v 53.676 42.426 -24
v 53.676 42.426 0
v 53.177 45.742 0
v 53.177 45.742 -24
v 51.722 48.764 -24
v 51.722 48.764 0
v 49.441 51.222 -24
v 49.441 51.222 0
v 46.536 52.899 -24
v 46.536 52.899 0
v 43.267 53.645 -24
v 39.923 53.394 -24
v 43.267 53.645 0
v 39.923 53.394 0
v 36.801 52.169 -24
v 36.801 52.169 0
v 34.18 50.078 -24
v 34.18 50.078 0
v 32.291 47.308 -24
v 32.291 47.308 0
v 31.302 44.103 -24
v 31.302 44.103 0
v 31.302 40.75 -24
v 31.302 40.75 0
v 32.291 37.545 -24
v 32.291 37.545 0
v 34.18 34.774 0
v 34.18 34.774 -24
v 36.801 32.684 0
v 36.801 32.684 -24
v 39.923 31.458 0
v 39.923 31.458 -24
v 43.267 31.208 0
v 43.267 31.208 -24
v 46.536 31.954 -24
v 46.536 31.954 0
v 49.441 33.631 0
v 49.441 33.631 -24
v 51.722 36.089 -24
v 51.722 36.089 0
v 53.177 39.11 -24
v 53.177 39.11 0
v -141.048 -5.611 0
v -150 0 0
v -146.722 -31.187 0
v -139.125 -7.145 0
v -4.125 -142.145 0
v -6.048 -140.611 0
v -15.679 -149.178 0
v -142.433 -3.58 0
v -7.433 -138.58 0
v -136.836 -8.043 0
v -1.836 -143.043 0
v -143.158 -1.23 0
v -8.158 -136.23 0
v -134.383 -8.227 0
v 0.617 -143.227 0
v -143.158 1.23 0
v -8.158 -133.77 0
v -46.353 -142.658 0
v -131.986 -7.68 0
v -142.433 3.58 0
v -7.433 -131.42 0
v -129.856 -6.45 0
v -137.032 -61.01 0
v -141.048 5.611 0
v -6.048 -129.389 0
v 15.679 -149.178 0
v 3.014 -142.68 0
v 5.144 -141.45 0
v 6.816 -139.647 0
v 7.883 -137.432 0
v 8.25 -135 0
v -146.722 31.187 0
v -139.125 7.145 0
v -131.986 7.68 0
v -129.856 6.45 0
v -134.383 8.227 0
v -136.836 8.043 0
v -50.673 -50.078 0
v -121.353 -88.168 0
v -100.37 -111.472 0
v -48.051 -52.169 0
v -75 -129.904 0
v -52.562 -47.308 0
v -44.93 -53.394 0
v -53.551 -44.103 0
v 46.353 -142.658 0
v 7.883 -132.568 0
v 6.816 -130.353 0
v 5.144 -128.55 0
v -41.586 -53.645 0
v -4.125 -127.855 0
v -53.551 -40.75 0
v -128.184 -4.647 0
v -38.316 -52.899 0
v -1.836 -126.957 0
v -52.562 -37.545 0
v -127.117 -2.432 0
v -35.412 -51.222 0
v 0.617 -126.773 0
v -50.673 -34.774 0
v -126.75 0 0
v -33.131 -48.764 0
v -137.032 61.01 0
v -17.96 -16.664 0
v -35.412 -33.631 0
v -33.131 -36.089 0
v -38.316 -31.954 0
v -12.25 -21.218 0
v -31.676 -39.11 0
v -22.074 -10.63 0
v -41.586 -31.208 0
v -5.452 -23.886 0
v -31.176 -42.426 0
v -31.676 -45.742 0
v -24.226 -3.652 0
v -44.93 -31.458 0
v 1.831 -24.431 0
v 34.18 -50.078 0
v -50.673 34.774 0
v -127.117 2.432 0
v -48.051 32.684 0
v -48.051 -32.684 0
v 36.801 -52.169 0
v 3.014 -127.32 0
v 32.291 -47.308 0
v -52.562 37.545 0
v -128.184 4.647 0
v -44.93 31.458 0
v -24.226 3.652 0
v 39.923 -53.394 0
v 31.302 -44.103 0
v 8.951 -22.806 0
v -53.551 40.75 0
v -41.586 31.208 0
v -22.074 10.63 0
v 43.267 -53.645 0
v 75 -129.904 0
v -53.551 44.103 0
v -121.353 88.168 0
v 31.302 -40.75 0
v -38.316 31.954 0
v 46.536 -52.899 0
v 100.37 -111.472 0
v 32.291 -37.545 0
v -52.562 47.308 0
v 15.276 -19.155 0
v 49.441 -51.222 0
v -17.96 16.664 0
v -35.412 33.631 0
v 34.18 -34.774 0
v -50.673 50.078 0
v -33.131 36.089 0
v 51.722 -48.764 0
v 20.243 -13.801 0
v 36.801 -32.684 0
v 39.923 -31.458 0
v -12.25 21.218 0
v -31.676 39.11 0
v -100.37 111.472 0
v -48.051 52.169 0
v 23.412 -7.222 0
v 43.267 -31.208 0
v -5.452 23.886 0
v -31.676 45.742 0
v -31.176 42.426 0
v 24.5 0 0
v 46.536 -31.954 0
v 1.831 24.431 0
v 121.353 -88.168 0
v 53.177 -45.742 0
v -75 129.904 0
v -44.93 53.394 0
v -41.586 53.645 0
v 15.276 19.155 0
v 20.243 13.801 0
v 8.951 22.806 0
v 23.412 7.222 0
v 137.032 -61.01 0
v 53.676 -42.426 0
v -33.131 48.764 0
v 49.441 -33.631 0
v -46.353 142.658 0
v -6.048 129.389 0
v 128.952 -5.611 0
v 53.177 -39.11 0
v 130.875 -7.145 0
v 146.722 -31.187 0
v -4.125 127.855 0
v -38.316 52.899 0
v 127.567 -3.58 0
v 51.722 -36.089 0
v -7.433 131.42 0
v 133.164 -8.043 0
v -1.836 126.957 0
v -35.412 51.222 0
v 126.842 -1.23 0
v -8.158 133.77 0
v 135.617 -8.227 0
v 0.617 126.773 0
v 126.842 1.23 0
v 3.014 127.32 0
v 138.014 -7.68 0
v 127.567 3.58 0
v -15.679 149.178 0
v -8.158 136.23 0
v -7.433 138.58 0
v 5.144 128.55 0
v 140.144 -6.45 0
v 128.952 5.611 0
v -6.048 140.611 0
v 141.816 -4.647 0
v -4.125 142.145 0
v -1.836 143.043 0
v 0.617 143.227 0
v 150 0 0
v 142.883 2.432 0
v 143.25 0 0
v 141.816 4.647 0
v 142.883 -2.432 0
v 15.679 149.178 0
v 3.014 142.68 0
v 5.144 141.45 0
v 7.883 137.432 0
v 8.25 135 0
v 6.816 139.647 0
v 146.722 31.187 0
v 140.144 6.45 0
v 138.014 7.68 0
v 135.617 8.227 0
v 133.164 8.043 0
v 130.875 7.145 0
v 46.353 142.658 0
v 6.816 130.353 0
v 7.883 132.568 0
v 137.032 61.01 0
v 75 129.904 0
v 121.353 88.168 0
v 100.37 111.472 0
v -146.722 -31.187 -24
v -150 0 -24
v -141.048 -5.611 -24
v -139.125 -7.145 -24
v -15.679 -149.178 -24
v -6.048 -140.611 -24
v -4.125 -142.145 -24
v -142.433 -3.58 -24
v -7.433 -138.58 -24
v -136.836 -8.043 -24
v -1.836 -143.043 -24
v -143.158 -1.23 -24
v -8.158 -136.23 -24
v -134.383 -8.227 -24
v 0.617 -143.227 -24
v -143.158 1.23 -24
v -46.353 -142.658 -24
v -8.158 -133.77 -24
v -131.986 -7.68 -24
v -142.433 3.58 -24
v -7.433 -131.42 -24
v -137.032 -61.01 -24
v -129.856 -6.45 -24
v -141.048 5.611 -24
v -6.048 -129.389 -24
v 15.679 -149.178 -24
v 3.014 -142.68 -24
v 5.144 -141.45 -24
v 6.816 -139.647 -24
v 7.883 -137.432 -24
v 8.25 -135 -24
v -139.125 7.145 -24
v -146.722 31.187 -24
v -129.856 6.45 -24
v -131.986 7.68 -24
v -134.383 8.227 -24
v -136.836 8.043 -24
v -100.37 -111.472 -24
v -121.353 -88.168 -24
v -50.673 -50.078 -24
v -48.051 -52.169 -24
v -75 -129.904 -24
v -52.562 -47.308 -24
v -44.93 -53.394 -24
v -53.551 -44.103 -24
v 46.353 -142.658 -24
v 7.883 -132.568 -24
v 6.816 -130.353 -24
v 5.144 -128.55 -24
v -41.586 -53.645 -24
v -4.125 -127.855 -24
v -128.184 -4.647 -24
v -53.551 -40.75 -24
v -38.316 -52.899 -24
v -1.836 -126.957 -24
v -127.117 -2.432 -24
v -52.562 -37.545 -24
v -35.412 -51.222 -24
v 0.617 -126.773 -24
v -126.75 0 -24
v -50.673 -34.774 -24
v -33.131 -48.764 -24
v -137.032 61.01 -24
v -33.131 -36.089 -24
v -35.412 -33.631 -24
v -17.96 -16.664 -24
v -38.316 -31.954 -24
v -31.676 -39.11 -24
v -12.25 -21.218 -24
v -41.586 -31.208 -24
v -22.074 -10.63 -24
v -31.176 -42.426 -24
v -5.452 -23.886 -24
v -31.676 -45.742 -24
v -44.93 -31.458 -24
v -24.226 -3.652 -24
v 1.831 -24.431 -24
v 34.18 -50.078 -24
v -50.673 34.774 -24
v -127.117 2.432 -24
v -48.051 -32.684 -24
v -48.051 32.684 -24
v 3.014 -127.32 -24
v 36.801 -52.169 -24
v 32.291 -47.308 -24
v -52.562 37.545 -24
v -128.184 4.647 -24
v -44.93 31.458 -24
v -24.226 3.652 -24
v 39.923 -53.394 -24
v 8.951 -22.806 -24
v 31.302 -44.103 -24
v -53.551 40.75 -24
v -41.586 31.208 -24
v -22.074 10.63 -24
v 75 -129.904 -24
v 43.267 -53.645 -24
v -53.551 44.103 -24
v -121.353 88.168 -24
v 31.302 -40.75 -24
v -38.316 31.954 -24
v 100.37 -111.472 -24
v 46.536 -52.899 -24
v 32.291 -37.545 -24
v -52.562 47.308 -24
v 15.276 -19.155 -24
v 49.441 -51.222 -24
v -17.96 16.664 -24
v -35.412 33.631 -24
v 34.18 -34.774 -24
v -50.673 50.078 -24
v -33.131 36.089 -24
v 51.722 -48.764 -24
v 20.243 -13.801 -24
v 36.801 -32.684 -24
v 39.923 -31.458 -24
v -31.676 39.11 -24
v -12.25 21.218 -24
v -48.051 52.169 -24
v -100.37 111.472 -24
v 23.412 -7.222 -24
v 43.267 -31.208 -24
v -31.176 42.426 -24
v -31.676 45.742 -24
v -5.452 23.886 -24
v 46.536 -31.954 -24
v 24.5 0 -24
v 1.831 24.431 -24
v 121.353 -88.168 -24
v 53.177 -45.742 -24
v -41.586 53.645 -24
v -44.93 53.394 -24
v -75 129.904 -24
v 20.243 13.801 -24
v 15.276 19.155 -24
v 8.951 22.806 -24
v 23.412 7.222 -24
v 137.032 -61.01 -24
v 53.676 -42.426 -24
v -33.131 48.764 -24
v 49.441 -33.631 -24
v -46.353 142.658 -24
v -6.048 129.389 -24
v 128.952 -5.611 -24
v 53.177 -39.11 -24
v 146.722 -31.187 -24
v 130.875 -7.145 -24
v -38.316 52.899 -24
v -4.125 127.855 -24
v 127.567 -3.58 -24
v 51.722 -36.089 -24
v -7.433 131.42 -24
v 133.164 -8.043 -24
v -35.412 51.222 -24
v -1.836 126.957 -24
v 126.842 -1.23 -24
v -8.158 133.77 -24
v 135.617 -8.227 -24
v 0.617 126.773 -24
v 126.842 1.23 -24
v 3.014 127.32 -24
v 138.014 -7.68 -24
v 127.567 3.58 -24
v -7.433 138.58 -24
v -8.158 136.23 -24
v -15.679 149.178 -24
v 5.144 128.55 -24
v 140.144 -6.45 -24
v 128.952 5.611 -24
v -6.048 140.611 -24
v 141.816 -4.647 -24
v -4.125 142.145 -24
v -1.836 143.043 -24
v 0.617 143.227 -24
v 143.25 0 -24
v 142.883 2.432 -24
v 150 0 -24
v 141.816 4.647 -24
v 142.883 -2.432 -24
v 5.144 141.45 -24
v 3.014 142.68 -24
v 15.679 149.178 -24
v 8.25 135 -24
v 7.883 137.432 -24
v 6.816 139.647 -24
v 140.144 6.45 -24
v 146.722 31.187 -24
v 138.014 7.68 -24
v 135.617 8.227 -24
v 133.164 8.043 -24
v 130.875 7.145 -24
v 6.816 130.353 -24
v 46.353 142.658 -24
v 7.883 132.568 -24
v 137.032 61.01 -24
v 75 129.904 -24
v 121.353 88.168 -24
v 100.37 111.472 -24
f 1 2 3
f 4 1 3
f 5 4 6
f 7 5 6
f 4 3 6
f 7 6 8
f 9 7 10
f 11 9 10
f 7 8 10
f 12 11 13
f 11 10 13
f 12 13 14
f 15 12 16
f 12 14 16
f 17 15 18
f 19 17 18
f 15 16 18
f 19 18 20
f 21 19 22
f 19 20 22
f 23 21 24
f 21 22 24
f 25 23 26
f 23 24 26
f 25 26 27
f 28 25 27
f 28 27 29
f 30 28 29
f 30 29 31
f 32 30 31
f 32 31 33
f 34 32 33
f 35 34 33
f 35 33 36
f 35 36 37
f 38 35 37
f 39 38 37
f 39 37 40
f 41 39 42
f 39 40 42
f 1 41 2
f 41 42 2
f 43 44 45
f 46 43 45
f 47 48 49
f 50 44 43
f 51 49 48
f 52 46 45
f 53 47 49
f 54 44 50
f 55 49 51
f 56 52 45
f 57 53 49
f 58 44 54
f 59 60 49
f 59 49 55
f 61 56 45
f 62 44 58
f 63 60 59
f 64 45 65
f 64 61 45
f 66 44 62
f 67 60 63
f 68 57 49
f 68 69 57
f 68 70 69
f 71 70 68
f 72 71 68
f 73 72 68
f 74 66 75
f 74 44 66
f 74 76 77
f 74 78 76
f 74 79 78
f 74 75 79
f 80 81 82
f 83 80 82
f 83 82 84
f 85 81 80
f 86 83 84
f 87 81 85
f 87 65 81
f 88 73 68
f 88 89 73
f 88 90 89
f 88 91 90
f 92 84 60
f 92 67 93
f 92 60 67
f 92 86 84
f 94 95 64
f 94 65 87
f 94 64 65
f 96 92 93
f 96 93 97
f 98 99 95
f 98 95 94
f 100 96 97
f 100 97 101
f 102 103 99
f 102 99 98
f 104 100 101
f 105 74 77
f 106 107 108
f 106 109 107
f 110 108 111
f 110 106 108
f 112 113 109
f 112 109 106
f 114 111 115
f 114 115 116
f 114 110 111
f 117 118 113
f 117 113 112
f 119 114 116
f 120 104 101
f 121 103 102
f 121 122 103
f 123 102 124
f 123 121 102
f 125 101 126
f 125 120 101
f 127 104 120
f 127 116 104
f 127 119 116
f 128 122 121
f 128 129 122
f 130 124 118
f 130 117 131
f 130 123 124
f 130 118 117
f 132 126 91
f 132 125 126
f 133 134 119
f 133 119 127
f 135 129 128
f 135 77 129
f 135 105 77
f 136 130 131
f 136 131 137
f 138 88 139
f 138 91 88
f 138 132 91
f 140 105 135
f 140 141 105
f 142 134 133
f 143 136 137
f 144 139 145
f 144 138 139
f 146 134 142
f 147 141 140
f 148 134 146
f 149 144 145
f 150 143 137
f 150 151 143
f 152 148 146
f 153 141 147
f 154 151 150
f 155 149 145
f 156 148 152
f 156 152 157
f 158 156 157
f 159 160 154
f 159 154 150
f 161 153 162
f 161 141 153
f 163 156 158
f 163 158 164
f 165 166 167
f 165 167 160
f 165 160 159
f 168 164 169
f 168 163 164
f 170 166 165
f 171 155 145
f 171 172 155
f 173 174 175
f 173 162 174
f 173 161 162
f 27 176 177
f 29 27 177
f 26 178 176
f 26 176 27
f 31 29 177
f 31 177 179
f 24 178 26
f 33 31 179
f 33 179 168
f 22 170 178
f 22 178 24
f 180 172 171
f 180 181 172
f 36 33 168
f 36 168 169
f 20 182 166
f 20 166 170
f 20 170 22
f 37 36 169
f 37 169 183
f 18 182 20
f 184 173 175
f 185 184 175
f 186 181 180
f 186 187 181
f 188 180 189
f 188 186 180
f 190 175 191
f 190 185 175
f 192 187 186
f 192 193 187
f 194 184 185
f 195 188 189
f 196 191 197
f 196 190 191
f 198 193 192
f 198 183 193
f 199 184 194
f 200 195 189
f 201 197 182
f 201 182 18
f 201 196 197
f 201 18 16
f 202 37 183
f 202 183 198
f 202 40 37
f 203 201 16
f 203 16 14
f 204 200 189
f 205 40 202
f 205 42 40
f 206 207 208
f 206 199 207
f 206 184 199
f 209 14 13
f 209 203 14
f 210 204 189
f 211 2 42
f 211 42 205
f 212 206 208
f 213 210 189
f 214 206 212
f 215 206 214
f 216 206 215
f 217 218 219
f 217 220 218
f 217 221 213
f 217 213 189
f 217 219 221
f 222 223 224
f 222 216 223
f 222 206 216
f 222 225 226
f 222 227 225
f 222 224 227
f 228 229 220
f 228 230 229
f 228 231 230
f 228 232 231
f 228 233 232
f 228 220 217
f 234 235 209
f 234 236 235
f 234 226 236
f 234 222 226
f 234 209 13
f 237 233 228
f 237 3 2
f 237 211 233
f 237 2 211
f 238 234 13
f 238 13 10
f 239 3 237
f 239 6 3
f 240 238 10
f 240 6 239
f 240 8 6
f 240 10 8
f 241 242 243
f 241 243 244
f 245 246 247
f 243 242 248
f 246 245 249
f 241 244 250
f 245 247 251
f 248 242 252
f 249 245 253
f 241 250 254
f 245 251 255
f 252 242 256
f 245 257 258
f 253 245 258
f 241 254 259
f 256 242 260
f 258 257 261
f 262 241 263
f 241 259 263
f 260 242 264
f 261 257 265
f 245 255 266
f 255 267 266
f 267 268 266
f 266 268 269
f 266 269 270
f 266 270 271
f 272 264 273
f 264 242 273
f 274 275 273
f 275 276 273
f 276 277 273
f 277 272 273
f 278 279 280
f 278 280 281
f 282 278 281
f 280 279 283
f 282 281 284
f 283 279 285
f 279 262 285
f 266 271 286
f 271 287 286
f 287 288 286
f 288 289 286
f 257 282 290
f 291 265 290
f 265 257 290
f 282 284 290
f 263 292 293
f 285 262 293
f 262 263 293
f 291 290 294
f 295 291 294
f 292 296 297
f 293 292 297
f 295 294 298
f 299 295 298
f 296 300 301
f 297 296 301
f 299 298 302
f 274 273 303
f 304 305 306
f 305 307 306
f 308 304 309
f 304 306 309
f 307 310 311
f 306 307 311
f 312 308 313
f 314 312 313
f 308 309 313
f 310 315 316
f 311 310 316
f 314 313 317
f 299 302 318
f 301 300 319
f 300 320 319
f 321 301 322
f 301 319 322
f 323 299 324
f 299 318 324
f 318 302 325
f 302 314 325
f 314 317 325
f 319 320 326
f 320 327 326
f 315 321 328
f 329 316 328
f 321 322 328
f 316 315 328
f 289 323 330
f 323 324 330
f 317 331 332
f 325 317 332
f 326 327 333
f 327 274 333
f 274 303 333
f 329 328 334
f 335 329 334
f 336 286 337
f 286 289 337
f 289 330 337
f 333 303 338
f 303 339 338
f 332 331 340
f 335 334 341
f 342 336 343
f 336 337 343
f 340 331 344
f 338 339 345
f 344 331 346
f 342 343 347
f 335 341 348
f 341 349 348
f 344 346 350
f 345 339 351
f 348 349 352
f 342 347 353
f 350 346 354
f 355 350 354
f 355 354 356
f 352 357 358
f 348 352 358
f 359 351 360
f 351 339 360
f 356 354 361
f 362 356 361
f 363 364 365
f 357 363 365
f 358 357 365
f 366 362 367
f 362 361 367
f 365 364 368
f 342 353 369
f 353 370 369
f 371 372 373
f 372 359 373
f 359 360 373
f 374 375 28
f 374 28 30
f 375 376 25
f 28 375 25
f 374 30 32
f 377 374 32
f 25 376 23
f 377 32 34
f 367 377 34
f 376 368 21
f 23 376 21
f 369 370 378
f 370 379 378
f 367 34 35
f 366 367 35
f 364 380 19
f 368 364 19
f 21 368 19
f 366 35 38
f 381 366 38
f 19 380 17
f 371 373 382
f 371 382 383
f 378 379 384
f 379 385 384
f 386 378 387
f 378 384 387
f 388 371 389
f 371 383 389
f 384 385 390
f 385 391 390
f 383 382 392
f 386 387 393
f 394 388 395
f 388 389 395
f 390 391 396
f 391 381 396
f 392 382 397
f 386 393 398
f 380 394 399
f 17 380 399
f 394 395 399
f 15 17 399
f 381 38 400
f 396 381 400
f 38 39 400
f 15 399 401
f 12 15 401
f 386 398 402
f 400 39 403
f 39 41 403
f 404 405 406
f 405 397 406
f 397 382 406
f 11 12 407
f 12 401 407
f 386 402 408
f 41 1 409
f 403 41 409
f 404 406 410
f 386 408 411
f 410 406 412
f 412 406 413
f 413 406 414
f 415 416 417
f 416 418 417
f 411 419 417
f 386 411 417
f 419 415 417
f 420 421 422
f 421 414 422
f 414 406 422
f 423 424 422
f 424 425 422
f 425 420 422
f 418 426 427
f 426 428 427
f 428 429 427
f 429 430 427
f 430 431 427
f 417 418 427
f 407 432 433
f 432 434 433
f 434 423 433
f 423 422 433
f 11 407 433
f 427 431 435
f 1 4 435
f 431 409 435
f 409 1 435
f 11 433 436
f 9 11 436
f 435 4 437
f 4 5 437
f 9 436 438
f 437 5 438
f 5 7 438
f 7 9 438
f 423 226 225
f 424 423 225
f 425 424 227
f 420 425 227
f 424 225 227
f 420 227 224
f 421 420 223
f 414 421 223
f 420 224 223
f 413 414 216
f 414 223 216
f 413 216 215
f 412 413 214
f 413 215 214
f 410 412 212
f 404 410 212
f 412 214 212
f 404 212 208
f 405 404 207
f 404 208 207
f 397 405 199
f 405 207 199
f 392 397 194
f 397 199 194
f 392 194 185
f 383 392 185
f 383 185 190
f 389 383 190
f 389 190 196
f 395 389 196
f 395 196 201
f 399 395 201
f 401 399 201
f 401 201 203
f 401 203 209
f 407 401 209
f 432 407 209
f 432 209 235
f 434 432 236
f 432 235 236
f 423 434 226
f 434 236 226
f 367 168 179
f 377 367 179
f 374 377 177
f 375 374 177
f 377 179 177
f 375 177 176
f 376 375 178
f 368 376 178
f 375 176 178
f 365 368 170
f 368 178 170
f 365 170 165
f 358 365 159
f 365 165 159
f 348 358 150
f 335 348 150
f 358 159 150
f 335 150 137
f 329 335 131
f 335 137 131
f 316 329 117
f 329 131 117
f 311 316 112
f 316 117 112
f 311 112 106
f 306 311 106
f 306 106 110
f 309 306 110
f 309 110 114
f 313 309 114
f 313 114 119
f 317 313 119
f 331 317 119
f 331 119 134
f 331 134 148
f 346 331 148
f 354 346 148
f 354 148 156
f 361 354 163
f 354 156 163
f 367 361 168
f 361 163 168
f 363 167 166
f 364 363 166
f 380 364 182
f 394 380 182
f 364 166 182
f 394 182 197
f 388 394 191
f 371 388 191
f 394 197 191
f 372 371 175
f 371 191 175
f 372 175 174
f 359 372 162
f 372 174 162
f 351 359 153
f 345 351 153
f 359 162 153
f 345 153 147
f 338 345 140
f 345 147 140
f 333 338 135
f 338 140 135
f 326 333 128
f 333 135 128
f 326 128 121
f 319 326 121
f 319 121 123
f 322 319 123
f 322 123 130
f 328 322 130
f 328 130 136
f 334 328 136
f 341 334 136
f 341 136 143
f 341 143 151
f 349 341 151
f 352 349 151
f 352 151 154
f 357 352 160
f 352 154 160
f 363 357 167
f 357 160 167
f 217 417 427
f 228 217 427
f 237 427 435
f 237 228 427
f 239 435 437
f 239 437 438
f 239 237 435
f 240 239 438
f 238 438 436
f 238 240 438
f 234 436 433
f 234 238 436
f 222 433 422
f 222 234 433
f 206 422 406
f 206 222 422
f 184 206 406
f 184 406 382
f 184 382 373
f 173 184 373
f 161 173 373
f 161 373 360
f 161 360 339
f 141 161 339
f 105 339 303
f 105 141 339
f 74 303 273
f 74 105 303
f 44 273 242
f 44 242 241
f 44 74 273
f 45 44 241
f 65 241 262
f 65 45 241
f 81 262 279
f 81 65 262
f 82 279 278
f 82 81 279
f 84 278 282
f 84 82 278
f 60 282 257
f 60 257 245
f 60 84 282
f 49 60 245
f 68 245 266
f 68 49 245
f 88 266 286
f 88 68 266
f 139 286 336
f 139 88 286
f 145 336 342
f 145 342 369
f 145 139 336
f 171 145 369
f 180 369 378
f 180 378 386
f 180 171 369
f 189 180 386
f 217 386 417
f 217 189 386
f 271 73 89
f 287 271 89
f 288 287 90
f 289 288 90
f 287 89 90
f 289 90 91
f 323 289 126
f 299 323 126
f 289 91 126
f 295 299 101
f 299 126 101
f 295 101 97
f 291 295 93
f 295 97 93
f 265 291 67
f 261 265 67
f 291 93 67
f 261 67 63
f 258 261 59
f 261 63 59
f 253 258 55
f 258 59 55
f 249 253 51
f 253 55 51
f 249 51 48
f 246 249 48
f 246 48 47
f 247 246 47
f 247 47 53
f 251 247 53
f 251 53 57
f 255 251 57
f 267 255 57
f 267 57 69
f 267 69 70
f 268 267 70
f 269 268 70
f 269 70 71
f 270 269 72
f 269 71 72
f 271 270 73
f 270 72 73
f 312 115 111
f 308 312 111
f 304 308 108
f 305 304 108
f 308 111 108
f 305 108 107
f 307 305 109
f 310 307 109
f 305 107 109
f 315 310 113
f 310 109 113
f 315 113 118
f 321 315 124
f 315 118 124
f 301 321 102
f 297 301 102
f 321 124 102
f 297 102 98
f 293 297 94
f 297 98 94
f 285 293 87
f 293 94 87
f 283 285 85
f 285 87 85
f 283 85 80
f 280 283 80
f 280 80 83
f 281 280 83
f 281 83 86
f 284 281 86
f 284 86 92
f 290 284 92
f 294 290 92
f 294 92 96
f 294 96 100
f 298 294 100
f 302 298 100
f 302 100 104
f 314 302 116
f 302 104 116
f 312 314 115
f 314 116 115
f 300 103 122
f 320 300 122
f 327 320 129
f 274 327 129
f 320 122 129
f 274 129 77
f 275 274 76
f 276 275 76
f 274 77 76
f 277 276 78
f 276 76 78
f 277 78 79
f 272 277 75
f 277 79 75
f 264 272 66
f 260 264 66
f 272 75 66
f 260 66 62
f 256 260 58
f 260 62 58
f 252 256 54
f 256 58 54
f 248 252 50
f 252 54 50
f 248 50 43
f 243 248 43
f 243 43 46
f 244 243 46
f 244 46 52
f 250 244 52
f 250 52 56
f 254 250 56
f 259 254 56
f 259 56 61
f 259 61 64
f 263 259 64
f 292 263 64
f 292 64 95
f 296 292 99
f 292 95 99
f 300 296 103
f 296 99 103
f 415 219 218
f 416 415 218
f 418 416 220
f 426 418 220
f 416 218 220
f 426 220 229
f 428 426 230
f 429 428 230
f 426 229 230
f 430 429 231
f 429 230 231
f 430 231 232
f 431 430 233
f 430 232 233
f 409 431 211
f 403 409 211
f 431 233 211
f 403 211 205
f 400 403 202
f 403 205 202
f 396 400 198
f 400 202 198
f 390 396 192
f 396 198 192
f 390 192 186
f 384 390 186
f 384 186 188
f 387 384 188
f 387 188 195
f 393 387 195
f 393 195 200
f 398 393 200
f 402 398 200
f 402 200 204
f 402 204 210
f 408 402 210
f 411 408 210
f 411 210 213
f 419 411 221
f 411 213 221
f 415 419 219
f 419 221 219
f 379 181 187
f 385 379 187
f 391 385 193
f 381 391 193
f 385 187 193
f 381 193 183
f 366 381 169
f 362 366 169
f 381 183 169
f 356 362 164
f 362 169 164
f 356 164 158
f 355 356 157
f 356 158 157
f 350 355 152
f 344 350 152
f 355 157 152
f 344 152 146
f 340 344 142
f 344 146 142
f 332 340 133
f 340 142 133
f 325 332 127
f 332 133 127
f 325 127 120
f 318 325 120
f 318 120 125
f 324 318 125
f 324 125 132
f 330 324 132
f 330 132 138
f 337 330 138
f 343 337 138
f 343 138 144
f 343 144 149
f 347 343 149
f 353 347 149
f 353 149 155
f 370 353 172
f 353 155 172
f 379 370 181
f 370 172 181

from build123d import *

# Parameters (mm, degrees)
F0_R     = 150
F0_R_2   = 11.25
F0_R_3   = 8.25
F0_R_4   = 24.5
F1_DEPTH = 24


with BuildPart() as f1:
    # F0 (on Top) → F1 (new body)
    with BuildSketch(Plane.XY):
        Circle(F0_R)
        with Locations((-42.426407, -42.426407)):
            Circle(F0_R_2, mode=Mode.SUBTRACT)
        with Locations((0, -135)):
            Circle(F0_R_3, mode=Mode.SUBTRACT)
        with Locations((42.426407, -42.426407)):
            Circle(F0_R_2, mode=Mode.SUBTRACT)
        with Locations((-135, 0)):
            Circle(F0_R_3, mode=Mode.SUBTRACT)
        with Locations((-42.426407, 42.426407)):
            Circle(F0_R_2, mode=Mode.SUBTRACT)
        Circle(F0_R_4, mode=Mode.SUBTRACT)
        with Locations((42.426407, 42.426407)):
            Circle(F0_R_2, mode=Mode.SUBTRACT)
        with Locations((135, 0)):
            Circle(F0_R_3, mode=Mode.SUBTRACT)
        with Locations((0, 135)):
            Circle(F0_R_3, mode=Mode.SUBTRACT)
    extrude(amount=-F1_DEPTH)


solid = f1.part
